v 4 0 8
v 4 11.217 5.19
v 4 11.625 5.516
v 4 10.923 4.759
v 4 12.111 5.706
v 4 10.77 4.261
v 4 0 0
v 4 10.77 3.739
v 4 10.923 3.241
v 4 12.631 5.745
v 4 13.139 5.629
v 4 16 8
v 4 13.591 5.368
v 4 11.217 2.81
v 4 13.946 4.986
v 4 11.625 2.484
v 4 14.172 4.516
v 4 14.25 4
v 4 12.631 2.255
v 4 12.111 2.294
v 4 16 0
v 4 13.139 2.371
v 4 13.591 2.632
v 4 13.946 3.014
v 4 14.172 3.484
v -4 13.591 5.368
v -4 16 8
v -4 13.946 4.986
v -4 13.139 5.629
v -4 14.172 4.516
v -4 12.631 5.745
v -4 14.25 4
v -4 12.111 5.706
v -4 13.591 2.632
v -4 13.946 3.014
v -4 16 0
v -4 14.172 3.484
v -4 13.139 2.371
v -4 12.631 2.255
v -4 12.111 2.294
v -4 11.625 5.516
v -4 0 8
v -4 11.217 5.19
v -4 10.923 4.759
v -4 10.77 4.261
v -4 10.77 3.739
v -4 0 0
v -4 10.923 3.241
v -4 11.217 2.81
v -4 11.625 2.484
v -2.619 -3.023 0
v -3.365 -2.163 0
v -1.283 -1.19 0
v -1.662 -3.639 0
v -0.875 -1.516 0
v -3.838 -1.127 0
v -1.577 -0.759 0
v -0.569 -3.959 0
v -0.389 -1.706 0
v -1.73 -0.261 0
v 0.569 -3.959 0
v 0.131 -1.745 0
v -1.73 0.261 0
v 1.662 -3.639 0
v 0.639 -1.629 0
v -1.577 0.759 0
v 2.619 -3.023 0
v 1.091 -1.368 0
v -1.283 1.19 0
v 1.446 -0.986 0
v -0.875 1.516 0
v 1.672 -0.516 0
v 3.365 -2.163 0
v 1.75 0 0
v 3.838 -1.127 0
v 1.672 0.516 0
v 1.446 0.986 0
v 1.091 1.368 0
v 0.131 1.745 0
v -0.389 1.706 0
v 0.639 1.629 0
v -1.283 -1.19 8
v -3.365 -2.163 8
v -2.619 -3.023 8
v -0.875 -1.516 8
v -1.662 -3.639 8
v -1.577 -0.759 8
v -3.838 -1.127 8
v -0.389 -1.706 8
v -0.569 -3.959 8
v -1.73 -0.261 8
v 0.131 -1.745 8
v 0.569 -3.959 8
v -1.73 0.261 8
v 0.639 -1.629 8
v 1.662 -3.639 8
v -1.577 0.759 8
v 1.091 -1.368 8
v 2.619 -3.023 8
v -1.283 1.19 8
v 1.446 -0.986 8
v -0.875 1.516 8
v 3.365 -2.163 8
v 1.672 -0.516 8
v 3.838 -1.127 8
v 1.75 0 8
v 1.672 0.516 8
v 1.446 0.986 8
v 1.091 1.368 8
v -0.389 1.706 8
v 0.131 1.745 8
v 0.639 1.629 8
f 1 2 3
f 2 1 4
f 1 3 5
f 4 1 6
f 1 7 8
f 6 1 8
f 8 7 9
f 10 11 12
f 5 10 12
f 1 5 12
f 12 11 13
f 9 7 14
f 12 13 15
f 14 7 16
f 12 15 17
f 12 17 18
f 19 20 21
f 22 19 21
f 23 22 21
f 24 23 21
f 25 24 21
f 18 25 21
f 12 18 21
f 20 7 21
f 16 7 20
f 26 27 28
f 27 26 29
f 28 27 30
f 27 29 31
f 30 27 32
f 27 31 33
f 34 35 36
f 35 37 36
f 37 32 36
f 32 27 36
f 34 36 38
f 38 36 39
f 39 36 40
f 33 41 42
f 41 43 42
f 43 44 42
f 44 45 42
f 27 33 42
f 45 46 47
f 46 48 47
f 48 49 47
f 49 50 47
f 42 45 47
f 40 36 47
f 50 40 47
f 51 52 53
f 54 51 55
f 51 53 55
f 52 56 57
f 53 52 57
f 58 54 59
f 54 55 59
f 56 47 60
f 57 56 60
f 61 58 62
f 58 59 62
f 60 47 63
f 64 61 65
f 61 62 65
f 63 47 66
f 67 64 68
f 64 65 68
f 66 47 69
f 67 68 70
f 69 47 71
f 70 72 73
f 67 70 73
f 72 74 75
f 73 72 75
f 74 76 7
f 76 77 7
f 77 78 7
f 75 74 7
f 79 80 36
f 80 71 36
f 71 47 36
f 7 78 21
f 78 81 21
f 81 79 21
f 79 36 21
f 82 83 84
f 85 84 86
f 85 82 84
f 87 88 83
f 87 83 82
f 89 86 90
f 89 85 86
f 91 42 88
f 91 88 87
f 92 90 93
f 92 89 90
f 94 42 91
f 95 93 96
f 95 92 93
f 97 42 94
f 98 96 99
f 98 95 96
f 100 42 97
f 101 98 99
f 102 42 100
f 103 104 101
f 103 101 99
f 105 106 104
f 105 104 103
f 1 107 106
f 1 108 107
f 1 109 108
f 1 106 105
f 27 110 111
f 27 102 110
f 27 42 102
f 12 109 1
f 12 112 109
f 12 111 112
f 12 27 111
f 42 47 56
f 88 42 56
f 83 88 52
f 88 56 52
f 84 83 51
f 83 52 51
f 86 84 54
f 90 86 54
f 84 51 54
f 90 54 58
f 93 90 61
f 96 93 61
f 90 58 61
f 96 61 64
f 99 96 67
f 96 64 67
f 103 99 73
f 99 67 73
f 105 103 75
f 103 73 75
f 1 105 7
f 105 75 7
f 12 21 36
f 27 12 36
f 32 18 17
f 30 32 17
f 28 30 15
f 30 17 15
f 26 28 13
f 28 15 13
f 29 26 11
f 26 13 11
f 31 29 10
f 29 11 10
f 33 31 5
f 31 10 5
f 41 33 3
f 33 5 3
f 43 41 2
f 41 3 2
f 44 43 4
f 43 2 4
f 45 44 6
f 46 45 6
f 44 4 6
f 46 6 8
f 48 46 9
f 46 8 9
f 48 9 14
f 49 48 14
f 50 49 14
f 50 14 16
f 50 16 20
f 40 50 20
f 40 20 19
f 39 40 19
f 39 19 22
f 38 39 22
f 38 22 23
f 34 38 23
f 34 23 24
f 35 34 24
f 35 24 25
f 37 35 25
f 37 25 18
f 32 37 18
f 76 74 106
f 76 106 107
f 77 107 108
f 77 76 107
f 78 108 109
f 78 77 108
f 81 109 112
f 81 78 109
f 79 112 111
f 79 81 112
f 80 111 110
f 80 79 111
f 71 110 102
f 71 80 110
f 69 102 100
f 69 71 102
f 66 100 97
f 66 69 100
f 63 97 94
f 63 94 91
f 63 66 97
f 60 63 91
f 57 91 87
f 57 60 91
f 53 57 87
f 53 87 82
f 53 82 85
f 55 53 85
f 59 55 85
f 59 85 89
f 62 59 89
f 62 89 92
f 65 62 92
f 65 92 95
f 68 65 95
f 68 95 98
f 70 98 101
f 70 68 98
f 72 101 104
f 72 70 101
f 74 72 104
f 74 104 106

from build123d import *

# Parameters (mm, degrees)
F0_R     = 1.75
F1_DEPTH = 8
F2_R     = 1.75
F3_DEPTH = 20


with BuildPart() as f1:
    # F0 (on Top) → F1 (new body)
    with BuildSketch(Plane.XY):
        with BuildLine():
            Line((-4, 16), (-4, 0))
            ThreePointArc((-4, 0), (0, -4), (4, 0))
            Line((4, 0), (4, 16))
            Line((4, 16), (-4, 16))
        make_face()
        Circle(F0_R, mode=Mode.SUBTRACT)
    extrude(amount=F1_DEPTH)

    # F2 (on face) → F3 (cut)
    with BuildSketch(Plane.YZ.offset(4)):
        with Locations((12.5, 4)):
            Circle(F2_R)
    extrude(amount=-F3_DEPTH, mode=Mode.SUBTRACT)


solid = f1.part
